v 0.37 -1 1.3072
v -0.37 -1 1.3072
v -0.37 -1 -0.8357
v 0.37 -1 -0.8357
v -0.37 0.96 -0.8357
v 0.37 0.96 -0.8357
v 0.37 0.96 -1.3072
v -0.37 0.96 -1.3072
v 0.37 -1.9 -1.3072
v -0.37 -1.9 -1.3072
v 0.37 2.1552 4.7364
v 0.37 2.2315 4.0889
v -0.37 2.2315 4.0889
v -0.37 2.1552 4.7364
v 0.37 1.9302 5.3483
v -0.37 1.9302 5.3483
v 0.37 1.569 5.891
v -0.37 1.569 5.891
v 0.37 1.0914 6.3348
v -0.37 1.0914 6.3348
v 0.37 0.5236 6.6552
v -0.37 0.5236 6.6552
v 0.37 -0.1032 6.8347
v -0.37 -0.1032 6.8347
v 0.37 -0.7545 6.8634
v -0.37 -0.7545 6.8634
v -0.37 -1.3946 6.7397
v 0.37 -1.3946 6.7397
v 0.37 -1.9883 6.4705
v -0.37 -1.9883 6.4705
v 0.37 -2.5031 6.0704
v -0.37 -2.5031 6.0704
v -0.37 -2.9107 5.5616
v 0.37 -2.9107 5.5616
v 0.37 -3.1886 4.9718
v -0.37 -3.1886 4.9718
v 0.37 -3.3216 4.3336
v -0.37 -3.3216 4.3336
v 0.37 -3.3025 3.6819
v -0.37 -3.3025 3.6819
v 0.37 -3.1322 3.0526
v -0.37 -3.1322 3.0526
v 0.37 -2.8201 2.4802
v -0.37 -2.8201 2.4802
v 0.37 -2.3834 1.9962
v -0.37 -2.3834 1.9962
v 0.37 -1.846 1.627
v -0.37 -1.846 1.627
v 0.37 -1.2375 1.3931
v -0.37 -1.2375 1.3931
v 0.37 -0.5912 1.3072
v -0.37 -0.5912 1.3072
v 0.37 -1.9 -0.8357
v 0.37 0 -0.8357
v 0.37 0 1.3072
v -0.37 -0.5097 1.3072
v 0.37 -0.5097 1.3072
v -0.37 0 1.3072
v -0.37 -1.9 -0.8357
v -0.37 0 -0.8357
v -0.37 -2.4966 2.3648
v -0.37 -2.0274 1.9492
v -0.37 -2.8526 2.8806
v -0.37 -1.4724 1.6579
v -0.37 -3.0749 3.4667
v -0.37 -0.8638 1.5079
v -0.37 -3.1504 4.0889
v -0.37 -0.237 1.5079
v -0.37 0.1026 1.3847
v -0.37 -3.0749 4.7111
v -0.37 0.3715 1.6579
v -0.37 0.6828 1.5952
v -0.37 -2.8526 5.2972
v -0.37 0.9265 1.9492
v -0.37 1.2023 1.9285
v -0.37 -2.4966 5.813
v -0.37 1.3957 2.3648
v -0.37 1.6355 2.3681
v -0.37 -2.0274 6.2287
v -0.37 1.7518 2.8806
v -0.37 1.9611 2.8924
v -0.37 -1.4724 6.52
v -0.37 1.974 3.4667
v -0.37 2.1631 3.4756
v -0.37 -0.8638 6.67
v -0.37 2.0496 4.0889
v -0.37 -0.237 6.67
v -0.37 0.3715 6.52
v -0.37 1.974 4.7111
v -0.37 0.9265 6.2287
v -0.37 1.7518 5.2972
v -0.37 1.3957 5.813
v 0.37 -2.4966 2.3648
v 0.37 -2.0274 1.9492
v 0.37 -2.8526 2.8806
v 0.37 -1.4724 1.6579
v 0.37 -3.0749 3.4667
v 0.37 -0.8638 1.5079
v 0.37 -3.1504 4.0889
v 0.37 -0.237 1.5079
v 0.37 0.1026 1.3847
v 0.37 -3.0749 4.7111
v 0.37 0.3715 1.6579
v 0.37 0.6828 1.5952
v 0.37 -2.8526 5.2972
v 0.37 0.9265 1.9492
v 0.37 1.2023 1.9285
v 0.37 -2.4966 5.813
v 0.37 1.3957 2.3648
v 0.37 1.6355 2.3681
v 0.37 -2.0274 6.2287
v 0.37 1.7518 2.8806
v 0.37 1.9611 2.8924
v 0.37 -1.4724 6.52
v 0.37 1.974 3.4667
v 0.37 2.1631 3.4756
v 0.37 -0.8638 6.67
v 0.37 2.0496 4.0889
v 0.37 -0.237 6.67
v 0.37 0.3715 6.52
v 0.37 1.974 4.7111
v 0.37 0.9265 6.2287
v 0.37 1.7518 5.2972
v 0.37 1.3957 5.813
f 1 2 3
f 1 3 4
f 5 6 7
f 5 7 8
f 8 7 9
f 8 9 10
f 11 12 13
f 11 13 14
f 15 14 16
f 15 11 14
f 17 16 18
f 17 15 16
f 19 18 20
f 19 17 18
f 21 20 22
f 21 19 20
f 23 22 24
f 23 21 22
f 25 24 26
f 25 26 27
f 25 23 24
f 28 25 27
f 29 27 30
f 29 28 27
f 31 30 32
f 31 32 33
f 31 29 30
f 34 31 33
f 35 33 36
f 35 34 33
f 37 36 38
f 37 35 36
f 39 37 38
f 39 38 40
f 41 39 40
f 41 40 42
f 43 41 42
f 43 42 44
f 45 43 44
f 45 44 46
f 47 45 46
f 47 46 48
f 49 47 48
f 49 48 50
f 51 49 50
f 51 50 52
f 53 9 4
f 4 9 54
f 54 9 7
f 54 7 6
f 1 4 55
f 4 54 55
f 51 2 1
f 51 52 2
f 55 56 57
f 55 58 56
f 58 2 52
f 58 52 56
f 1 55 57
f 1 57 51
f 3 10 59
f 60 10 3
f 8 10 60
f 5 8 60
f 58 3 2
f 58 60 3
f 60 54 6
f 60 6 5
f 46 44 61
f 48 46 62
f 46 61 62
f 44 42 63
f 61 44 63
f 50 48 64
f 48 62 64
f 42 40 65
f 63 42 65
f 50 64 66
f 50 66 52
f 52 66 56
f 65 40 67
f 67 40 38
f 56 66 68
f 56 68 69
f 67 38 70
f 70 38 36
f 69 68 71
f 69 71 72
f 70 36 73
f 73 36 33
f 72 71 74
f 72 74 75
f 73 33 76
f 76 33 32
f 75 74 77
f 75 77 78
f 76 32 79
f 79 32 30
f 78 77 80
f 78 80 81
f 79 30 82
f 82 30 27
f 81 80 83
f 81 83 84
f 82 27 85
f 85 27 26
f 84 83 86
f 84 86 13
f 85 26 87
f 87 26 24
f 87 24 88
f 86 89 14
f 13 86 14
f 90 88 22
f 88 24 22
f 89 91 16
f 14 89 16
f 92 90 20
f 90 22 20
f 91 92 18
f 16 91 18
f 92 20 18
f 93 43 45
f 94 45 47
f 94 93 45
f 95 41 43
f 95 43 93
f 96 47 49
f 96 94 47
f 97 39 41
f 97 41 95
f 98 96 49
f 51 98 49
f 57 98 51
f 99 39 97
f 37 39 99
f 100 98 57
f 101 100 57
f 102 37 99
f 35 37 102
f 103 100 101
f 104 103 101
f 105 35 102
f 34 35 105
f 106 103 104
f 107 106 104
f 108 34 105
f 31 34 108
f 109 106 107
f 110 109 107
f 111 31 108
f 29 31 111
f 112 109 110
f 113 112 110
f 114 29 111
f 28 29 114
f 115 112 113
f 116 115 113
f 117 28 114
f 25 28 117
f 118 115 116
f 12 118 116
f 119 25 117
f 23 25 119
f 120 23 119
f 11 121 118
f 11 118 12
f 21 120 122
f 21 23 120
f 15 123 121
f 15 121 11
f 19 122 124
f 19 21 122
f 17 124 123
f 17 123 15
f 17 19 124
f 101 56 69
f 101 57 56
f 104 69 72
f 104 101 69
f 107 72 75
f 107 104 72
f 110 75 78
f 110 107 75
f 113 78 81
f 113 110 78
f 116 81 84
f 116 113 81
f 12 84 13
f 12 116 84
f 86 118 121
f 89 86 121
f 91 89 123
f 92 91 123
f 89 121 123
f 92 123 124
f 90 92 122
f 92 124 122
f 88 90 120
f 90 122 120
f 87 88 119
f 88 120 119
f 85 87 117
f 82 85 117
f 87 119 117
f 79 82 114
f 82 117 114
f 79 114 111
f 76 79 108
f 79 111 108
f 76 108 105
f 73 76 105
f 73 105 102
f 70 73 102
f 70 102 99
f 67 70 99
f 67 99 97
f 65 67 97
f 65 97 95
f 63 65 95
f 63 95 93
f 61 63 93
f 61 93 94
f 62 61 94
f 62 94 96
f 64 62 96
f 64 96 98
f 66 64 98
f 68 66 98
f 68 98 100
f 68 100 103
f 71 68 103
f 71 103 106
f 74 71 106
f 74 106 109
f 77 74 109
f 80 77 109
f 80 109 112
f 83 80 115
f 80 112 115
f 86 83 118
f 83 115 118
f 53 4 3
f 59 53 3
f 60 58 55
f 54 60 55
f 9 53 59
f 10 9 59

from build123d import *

# Parameters (mm, degrees)
F0_W          = 0.7400371833
F0_H          = 2.6144962758
F1_DEPTH      = 1
F3_W          = 0.7400371833
F3_H          = 0.471592648
F4_DEPTH      = 0.96
F4_DEPTH_BACK = 1.9
F5_R          = 2.5243511124
F6_DEPTH      = 0.37
F6_DEPTH_BACK = 0.37
F7_R          = 2.7819768233
F8_DEPTH      = 0.37
F9_R          = 2.6
F10_DEPTH     = 2.5


with BuildPart() as f1:
    # F0 (on Front) → F1 (new body)
    with BuildSketch(Plane.XZ):
        Rectangle(F0_W, F0_H)
    extrude(amount=F1_DEPTH)

    # F3 (on face) → F4 (join, two sides)
    with BuildSketch(Plane(origin=(0, 0, 0), x_dir=(-1, 0, 0), z_dir=(0, 1, 0))) as f4_sk:
        with Locations((0, -1.0714518139)):
            Rectangle(F3_W, F3_H)
    extrude(amount=F4_DEPTH)
    extrude(f4_sk.sketch, amount=-F4_DEPTH_BACK)

    # F5 (on Right) → F6 (cut, two sides)
    with BuildSketch(Plane.YZ) as f6_sk:
        with Locations((-0.5211759007, 3.8327652696)):
            Circle(F5_R)
    extrude(amount=-F6_DEPTH, mode=Mode.SUBTRACT)
    extrude(f6_sk.sketch, amount=F6_DEPTH_BACK, mode=Mode.SUBTRACT)

    # F7 (on Right) → F8 (join, symmetric)
    with BuildSketch(Plane.YZ):
        with Locations((-0.550427369, 4.088926369)):
            Circle(F7_R)
    extrude(amount=F8_DEPTH, both=True)

    # F9 (on face) → F10 (cut)
    with BuildSketch(Plane.YZ.offset(0.37)):
        with Locations((-0.550427369, 4.088926369)):
            Circle(F9_R)
    extrude(amount=-F10_DEPTH, mode=Mode.SUBTRACT)


solid = f1.part
